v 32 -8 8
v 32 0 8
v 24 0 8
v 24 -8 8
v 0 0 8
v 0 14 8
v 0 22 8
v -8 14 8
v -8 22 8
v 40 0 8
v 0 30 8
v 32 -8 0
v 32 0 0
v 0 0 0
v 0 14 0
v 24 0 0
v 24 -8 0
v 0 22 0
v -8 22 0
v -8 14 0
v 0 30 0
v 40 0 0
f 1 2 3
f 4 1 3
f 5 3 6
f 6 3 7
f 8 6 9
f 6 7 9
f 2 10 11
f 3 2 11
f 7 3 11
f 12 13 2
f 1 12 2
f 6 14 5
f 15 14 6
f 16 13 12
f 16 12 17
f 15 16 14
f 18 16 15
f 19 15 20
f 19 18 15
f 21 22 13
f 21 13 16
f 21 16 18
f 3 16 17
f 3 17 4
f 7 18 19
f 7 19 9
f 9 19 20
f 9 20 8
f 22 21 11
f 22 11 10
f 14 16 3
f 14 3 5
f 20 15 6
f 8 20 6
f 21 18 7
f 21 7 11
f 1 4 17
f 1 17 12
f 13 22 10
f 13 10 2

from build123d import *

# Parameters (mm, degrees)
SIDE_BOSS_EXTRUDE1_DEPTH               = 8
SKETCH2_W                              = 8
SKETCH2_H                              = 8
PUZZLE_SLOT_BACK_BOSS_EXTRUDE2_DEPTH   = 8
SKETCH3_W                              = 8
SKETCH3_H                              = 8
PUZZLE_SLOT_BOTTOM_BOSS_EXTRUDE3_DEPTH = 8


with BuildPart() as part:
    # Sketch1 → Side Boss-Extrude1 (new body)
    with BuildSketch(Plane.XY):
        Polygon((0, 0), (0, 30), (40, 0), align=None)
    extrude(amount=SIDE_BOSS_EXTRUDE1_DEPTH)

    # Sketch2 → Puzzle Slot Back Boss-Extrude2 (add)
    with BuildSketch(Plane.ZY):
        with Locations((4, 18)):
            Rectangle(SKETCH2_W, SKETCH2_H)
    extrude(amount=PUZZLE_SLOT_BACK_BOSS_EXTRUDE2_DEPTH)

    # Sketch3 → Puzzle Slot Bottom Boss-Extrude3 (add)
    with BuildSketch(Plane.XZ):
        with Locations((28, 4)):
            Rectangle(SKETCH3_W, SKETCH3_H)
    extrude(amount=PUZZLE_SLOT_BOTTOM_BOSS_EXTRUDE3_DEPTH)


solid = part.part
